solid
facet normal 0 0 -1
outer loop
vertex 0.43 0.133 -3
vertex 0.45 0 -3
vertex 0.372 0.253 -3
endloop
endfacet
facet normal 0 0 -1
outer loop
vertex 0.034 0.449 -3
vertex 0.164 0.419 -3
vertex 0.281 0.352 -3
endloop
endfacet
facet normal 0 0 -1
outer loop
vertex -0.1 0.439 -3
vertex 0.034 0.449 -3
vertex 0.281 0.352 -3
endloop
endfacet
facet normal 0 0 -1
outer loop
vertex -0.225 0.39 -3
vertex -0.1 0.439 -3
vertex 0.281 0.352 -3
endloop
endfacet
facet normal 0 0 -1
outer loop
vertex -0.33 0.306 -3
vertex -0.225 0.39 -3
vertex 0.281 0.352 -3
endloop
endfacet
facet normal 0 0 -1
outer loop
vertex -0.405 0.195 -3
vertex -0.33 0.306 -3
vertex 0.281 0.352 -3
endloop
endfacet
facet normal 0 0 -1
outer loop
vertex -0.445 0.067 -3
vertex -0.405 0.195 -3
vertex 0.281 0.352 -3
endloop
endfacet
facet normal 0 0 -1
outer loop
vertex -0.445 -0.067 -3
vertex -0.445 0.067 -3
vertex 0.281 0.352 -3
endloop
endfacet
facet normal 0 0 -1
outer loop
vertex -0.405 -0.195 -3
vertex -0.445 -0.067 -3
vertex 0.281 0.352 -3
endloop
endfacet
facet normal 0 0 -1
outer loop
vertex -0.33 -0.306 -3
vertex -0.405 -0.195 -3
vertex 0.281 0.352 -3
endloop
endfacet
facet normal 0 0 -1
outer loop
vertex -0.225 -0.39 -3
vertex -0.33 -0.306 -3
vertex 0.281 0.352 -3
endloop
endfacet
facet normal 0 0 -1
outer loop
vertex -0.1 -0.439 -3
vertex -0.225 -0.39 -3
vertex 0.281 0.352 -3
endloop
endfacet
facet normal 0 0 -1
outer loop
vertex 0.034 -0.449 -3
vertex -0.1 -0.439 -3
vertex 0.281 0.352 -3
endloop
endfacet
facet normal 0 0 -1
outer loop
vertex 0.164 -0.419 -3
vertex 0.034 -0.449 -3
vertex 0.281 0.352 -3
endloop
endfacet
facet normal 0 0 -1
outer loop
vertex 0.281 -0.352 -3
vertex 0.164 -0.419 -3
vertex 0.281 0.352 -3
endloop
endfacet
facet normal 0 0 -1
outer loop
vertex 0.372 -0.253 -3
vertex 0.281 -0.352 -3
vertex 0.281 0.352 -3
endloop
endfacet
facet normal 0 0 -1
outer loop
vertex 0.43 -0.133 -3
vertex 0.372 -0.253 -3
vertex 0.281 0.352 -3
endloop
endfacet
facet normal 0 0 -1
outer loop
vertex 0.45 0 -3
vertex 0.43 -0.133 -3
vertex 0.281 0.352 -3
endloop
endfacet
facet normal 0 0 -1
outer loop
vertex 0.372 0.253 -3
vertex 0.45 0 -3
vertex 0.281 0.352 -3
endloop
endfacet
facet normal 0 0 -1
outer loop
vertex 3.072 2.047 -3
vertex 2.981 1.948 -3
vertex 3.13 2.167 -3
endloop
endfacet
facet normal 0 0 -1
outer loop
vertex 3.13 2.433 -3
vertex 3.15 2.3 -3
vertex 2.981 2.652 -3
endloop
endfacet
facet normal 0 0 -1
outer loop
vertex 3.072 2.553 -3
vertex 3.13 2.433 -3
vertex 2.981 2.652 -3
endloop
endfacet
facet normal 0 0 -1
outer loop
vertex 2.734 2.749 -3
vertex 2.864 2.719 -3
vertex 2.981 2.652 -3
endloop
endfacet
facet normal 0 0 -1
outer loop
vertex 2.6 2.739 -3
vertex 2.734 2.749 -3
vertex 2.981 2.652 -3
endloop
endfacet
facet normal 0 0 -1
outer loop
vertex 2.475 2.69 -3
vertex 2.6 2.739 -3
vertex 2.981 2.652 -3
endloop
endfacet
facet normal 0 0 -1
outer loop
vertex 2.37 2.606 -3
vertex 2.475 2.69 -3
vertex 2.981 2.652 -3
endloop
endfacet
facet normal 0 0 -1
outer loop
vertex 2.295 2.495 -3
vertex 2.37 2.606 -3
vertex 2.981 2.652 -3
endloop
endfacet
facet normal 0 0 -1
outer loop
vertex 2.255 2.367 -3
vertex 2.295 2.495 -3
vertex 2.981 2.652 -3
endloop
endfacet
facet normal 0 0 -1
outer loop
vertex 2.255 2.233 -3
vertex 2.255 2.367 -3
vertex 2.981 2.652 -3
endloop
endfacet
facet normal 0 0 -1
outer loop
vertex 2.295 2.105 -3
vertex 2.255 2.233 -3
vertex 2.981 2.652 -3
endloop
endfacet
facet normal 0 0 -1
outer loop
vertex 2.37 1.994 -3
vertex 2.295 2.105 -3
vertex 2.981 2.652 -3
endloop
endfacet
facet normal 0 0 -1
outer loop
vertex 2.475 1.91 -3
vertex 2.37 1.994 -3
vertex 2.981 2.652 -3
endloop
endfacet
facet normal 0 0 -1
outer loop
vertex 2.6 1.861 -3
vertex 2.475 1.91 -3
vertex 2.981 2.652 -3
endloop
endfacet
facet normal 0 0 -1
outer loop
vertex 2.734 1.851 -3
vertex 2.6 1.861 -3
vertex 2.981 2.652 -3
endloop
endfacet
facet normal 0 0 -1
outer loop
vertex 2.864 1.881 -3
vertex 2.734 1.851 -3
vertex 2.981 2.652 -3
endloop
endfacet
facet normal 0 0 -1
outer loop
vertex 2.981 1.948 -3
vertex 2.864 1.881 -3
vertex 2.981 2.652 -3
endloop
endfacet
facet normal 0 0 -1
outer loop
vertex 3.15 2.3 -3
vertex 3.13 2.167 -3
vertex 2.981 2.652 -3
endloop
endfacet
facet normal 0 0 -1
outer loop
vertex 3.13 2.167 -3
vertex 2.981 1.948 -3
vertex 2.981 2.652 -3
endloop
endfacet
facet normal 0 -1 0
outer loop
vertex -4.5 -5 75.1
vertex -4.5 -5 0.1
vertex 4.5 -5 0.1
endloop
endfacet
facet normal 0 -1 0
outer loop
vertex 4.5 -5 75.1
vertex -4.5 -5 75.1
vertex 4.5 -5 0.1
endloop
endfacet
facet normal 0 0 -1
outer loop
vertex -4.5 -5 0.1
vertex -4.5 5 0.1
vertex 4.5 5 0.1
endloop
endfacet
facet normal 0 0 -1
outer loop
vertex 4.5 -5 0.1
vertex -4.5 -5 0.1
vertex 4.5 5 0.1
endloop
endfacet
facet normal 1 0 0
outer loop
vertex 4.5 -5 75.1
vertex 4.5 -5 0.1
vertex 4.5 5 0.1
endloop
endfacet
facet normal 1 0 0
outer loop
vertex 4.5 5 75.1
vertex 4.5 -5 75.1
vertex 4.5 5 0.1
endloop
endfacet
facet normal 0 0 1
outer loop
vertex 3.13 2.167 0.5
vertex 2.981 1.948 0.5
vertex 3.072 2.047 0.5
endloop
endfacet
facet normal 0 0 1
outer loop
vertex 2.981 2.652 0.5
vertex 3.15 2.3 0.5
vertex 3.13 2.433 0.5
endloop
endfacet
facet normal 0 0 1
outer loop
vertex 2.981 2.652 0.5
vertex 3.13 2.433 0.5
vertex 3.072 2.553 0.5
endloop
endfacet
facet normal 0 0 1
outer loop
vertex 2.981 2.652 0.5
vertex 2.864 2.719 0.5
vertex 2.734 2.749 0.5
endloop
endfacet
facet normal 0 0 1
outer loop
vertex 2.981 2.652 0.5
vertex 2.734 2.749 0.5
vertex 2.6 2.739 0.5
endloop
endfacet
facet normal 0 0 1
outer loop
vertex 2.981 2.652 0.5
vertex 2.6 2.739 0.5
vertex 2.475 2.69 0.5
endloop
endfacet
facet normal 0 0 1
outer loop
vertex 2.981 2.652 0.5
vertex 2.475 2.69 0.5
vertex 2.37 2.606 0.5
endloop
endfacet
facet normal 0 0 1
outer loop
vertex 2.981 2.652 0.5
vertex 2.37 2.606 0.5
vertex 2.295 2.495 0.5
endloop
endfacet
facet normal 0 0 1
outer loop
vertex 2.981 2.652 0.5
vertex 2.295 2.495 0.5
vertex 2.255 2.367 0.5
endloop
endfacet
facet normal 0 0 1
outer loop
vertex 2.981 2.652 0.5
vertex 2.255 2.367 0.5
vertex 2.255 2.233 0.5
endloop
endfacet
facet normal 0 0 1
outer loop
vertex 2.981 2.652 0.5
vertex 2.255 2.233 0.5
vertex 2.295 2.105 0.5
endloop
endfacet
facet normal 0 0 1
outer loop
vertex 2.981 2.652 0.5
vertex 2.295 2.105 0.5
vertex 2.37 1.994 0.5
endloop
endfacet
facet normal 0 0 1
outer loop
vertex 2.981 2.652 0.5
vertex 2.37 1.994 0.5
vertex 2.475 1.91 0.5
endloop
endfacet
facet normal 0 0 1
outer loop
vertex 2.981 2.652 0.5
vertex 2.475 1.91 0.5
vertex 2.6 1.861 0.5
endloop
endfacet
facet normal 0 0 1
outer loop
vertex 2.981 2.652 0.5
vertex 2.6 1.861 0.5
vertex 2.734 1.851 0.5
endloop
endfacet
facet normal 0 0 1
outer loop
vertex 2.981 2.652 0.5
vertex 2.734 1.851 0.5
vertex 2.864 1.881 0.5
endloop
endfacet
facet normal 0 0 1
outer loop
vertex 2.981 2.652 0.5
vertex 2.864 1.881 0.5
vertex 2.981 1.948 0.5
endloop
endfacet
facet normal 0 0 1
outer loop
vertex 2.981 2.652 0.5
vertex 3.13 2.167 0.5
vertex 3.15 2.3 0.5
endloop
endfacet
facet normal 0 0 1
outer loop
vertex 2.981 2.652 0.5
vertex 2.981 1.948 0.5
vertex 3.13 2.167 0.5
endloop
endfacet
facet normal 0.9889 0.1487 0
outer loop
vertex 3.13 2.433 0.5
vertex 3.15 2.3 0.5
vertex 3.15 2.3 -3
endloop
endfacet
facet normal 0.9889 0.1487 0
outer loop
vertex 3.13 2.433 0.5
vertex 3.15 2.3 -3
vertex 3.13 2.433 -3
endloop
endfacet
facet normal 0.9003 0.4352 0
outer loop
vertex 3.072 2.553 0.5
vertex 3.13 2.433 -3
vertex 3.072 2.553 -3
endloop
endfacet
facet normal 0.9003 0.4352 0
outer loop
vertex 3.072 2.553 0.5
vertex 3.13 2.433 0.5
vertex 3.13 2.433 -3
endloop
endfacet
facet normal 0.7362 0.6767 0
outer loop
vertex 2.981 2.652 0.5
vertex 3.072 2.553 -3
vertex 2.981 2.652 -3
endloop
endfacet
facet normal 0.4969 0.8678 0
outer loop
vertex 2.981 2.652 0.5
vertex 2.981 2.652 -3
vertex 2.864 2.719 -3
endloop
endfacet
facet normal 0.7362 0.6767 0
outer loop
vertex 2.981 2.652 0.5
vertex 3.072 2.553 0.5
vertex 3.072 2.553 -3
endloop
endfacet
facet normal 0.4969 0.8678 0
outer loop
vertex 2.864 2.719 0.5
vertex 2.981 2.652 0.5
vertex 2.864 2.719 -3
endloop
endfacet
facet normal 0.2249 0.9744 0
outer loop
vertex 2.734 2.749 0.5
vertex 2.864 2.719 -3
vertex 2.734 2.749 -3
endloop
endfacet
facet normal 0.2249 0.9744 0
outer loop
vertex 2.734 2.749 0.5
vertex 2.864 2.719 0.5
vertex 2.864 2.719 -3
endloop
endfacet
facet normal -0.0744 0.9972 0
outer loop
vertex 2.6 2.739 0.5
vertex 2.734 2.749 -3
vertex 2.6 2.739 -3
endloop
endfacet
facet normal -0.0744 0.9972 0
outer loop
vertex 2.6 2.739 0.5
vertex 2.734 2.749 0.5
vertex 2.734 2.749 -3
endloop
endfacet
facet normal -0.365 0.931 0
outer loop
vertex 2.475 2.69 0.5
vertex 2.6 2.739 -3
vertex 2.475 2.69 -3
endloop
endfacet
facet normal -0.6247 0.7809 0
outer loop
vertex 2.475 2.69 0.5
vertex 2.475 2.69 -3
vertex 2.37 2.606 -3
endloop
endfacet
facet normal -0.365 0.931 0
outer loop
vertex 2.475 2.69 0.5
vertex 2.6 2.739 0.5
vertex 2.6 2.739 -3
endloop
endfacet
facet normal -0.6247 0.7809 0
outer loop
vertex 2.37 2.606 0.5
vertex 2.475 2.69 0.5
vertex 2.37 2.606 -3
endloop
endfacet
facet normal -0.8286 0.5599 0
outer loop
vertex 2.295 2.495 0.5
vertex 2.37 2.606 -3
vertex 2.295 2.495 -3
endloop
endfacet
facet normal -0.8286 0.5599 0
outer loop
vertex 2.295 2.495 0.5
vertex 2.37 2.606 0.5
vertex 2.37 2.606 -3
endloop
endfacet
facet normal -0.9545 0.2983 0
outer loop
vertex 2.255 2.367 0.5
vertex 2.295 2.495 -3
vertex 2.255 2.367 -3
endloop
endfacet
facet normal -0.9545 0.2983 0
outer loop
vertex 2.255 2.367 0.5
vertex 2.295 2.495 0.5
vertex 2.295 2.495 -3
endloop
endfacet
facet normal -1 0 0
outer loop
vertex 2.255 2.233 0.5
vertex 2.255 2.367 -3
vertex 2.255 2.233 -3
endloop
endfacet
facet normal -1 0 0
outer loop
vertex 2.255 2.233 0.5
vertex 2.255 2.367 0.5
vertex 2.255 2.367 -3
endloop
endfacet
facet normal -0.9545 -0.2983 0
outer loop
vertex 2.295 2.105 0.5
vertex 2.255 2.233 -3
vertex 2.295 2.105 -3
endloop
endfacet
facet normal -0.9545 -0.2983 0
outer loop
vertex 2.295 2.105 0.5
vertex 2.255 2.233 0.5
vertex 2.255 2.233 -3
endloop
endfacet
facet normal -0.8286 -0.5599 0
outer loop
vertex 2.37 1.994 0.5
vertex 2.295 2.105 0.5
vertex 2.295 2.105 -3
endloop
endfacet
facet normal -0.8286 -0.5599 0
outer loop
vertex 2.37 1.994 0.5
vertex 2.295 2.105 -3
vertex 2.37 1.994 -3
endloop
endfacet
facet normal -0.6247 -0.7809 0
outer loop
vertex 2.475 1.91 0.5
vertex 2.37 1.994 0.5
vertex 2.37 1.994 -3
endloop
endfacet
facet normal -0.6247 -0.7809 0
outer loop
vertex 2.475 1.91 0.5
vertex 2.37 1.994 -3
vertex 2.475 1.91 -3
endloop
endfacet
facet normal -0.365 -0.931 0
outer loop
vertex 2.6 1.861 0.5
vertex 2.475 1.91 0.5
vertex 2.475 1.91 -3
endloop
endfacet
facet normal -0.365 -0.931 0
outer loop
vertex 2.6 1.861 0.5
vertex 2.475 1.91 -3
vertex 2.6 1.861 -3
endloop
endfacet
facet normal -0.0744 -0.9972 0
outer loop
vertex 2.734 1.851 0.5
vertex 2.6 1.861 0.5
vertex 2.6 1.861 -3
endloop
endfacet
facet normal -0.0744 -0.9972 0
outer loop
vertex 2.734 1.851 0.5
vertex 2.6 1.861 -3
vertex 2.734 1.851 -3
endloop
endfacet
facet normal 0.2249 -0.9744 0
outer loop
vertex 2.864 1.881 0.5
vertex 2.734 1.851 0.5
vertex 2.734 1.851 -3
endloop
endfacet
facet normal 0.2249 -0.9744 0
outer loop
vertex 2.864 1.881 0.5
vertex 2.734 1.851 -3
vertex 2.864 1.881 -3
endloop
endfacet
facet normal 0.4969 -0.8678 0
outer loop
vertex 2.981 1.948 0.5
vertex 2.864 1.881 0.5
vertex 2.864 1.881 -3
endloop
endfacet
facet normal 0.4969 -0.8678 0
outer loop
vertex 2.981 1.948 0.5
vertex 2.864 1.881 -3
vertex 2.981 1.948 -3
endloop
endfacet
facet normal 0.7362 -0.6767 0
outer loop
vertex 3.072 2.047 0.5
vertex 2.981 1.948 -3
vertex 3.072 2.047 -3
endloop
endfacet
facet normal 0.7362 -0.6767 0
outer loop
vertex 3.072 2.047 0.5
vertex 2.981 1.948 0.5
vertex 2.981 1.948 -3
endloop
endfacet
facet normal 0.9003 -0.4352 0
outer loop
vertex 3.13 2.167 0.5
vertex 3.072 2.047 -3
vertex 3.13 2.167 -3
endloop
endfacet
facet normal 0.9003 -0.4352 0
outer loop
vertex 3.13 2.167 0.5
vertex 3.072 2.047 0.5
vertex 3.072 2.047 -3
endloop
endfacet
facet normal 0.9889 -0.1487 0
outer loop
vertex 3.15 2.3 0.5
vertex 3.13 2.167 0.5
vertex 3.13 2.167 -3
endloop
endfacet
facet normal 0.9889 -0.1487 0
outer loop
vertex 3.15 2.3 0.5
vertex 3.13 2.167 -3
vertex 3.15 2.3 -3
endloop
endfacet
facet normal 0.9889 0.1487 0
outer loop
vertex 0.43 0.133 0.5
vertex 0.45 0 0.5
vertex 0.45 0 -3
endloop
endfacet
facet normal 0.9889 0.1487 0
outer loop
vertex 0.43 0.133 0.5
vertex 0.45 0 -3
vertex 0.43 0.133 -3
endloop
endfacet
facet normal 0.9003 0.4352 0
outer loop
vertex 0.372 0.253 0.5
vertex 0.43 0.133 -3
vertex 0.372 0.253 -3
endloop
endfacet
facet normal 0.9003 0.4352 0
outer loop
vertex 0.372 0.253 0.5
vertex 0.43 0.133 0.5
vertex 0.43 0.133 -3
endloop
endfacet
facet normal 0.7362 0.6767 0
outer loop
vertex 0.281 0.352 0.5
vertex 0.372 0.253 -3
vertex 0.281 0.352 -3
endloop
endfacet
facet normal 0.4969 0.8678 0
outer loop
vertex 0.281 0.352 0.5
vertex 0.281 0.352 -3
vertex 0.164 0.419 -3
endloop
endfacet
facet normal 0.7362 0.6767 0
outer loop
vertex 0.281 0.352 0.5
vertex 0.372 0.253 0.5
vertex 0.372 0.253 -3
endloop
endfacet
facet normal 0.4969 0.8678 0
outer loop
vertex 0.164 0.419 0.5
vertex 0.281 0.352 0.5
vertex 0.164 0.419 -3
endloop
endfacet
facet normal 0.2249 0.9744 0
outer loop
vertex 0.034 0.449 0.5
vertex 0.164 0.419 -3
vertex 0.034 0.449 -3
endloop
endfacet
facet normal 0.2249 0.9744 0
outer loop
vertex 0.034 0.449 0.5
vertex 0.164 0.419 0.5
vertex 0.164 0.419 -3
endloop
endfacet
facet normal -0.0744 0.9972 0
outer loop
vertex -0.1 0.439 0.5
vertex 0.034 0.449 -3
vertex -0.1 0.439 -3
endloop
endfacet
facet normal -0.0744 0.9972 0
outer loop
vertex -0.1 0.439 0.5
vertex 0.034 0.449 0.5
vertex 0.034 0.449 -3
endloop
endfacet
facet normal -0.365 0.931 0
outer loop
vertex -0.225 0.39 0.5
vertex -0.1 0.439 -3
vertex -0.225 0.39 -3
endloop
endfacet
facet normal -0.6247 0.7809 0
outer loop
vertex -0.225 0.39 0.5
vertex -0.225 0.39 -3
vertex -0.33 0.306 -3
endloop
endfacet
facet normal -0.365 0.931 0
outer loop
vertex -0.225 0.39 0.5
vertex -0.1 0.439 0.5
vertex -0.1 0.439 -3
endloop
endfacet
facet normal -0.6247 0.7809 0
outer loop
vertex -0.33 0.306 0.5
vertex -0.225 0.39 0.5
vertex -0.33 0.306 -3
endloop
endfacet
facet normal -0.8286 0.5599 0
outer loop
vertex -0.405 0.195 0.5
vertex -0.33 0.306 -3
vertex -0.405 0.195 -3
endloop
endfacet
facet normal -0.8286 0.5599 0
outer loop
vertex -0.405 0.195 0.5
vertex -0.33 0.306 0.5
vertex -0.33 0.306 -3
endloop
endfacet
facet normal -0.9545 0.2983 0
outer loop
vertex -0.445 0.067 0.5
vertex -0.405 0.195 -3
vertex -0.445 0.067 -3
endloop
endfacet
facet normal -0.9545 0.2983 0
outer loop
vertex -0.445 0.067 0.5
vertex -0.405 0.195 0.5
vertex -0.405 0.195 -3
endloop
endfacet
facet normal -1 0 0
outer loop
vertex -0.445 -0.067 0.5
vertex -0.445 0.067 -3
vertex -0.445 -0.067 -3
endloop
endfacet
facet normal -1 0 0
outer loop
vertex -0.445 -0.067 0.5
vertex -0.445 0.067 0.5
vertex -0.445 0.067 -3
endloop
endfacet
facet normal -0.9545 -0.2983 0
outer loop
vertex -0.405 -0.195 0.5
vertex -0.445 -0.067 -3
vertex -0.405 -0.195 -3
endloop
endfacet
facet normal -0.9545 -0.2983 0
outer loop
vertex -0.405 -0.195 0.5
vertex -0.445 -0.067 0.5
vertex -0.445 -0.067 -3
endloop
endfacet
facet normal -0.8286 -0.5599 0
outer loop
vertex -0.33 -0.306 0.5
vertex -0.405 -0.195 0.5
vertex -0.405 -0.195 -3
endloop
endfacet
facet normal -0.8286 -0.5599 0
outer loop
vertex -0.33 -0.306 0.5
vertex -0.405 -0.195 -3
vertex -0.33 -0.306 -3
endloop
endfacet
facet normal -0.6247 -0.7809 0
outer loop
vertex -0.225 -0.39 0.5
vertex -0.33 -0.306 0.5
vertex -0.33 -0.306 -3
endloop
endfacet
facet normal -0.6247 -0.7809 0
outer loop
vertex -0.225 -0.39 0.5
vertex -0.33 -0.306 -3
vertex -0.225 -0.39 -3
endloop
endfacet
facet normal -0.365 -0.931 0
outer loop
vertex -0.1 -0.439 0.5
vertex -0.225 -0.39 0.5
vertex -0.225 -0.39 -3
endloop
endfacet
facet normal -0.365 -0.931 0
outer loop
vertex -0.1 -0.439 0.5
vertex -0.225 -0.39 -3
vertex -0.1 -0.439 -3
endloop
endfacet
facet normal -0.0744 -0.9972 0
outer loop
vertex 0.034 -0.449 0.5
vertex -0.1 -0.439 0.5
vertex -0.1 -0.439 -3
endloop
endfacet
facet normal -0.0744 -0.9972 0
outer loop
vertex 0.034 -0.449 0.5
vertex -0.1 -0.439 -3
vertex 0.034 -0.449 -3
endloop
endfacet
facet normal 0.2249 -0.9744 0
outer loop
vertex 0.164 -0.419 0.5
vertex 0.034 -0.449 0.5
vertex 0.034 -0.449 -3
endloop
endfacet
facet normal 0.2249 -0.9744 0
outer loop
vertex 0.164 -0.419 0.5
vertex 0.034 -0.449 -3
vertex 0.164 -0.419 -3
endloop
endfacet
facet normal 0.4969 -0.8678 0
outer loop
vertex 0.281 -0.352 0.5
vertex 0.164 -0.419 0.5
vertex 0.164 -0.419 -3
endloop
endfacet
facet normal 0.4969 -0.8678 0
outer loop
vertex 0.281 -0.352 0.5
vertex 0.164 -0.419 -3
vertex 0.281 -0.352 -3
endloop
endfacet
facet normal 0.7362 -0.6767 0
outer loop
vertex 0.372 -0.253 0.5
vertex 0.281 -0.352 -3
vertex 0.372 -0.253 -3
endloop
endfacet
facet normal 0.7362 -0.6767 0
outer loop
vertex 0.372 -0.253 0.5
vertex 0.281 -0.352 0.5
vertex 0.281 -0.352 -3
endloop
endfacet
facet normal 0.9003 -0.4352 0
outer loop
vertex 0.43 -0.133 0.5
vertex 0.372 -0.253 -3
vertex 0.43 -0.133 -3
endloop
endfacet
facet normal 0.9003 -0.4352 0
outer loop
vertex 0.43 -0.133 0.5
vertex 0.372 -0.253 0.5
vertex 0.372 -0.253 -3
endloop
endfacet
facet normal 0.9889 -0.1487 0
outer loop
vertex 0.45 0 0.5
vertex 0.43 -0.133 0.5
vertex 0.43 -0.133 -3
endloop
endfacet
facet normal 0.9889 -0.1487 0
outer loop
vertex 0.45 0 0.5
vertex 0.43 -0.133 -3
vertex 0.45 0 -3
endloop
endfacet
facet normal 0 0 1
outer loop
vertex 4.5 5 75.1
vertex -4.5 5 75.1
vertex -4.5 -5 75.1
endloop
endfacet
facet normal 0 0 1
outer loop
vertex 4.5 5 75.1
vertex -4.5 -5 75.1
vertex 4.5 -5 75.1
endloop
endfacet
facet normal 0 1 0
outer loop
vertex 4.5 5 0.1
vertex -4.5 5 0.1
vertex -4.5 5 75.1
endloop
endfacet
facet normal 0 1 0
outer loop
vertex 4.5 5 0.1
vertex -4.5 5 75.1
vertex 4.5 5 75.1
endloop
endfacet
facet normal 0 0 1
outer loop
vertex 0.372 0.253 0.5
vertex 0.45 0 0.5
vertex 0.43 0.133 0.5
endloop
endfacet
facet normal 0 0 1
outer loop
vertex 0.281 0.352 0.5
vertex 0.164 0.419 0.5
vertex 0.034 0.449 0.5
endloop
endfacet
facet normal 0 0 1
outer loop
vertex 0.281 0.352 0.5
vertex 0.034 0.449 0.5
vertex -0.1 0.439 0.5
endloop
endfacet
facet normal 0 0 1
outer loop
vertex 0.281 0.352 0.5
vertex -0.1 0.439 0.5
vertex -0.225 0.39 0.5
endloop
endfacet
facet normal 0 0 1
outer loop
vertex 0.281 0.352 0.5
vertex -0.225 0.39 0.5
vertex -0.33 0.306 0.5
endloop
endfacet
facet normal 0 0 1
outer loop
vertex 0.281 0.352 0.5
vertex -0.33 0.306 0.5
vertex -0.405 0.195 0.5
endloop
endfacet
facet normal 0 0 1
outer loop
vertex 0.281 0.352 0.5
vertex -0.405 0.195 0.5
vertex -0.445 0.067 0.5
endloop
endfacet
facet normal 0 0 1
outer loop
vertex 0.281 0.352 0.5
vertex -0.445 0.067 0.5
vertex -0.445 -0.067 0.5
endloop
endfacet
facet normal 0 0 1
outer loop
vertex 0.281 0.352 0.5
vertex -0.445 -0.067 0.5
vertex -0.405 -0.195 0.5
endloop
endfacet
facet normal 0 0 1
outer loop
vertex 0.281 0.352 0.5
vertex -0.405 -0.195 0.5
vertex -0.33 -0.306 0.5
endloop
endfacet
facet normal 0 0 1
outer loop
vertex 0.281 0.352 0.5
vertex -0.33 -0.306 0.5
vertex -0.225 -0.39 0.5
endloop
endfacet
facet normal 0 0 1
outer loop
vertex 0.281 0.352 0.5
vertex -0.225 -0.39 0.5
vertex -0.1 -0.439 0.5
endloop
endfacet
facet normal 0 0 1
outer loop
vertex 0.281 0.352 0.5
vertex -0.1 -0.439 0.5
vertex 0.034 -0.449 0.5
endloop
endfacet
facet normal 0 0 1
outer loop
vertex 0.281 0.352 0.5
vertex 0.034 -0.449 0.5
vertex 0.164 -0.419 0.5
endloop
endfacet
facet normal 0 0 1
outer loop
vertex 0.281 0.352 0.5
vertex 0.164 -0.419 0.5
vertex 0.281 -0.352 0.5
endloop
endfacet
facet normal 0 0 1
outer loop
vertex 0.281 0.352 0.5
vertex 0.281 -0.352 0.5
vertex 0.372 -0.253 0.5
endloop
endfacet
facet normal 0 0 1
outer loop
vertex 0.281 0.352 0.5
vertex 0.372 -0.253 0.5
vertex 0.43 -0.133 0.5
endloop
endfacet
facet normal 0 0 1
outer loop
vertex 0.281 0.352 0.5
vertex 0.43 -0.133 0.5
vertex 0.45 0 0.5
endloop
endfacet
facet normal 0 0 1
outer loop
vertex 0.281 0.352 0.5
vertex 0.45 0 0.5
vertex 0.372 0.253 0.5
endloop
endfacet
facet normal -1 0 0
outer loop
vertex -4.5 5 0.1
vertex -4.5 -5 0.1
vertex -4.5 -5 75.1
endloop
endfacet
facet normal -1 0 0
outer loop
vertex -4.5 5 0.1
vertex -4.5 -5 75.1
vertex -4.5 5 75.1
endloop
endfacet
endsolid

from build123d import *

# Parameters (mm, degrees)
SKETCH_W     = 9
SKETCH_H     = 10
PAD_DEPTH    = 75
SKETCH001_R  = 0.45
PAD001_DEPTH = 3.5


with BuildPart() as pad:
    # Sketch → Pad (new body)
    with BuildSketch(Plane.XY.offset(0.1)):
        Rectangle(SKETCH_W, SKETCH_H)
    extrude(amount=PAD_DEPTH)


with BuildPart() as pad001:
    # Sketch001 → Pad001 (new body)
    with BuildSketch(Plane.XY.offset(0.5)):
        Circle(SKETCH001_R)
        with Locations((2.7, 2.3)):
            Circle(SKETCH001_R)
    extrude(amount=-PAD001_DEPTH)


solid = Compound([pad.part, pad001.part])
